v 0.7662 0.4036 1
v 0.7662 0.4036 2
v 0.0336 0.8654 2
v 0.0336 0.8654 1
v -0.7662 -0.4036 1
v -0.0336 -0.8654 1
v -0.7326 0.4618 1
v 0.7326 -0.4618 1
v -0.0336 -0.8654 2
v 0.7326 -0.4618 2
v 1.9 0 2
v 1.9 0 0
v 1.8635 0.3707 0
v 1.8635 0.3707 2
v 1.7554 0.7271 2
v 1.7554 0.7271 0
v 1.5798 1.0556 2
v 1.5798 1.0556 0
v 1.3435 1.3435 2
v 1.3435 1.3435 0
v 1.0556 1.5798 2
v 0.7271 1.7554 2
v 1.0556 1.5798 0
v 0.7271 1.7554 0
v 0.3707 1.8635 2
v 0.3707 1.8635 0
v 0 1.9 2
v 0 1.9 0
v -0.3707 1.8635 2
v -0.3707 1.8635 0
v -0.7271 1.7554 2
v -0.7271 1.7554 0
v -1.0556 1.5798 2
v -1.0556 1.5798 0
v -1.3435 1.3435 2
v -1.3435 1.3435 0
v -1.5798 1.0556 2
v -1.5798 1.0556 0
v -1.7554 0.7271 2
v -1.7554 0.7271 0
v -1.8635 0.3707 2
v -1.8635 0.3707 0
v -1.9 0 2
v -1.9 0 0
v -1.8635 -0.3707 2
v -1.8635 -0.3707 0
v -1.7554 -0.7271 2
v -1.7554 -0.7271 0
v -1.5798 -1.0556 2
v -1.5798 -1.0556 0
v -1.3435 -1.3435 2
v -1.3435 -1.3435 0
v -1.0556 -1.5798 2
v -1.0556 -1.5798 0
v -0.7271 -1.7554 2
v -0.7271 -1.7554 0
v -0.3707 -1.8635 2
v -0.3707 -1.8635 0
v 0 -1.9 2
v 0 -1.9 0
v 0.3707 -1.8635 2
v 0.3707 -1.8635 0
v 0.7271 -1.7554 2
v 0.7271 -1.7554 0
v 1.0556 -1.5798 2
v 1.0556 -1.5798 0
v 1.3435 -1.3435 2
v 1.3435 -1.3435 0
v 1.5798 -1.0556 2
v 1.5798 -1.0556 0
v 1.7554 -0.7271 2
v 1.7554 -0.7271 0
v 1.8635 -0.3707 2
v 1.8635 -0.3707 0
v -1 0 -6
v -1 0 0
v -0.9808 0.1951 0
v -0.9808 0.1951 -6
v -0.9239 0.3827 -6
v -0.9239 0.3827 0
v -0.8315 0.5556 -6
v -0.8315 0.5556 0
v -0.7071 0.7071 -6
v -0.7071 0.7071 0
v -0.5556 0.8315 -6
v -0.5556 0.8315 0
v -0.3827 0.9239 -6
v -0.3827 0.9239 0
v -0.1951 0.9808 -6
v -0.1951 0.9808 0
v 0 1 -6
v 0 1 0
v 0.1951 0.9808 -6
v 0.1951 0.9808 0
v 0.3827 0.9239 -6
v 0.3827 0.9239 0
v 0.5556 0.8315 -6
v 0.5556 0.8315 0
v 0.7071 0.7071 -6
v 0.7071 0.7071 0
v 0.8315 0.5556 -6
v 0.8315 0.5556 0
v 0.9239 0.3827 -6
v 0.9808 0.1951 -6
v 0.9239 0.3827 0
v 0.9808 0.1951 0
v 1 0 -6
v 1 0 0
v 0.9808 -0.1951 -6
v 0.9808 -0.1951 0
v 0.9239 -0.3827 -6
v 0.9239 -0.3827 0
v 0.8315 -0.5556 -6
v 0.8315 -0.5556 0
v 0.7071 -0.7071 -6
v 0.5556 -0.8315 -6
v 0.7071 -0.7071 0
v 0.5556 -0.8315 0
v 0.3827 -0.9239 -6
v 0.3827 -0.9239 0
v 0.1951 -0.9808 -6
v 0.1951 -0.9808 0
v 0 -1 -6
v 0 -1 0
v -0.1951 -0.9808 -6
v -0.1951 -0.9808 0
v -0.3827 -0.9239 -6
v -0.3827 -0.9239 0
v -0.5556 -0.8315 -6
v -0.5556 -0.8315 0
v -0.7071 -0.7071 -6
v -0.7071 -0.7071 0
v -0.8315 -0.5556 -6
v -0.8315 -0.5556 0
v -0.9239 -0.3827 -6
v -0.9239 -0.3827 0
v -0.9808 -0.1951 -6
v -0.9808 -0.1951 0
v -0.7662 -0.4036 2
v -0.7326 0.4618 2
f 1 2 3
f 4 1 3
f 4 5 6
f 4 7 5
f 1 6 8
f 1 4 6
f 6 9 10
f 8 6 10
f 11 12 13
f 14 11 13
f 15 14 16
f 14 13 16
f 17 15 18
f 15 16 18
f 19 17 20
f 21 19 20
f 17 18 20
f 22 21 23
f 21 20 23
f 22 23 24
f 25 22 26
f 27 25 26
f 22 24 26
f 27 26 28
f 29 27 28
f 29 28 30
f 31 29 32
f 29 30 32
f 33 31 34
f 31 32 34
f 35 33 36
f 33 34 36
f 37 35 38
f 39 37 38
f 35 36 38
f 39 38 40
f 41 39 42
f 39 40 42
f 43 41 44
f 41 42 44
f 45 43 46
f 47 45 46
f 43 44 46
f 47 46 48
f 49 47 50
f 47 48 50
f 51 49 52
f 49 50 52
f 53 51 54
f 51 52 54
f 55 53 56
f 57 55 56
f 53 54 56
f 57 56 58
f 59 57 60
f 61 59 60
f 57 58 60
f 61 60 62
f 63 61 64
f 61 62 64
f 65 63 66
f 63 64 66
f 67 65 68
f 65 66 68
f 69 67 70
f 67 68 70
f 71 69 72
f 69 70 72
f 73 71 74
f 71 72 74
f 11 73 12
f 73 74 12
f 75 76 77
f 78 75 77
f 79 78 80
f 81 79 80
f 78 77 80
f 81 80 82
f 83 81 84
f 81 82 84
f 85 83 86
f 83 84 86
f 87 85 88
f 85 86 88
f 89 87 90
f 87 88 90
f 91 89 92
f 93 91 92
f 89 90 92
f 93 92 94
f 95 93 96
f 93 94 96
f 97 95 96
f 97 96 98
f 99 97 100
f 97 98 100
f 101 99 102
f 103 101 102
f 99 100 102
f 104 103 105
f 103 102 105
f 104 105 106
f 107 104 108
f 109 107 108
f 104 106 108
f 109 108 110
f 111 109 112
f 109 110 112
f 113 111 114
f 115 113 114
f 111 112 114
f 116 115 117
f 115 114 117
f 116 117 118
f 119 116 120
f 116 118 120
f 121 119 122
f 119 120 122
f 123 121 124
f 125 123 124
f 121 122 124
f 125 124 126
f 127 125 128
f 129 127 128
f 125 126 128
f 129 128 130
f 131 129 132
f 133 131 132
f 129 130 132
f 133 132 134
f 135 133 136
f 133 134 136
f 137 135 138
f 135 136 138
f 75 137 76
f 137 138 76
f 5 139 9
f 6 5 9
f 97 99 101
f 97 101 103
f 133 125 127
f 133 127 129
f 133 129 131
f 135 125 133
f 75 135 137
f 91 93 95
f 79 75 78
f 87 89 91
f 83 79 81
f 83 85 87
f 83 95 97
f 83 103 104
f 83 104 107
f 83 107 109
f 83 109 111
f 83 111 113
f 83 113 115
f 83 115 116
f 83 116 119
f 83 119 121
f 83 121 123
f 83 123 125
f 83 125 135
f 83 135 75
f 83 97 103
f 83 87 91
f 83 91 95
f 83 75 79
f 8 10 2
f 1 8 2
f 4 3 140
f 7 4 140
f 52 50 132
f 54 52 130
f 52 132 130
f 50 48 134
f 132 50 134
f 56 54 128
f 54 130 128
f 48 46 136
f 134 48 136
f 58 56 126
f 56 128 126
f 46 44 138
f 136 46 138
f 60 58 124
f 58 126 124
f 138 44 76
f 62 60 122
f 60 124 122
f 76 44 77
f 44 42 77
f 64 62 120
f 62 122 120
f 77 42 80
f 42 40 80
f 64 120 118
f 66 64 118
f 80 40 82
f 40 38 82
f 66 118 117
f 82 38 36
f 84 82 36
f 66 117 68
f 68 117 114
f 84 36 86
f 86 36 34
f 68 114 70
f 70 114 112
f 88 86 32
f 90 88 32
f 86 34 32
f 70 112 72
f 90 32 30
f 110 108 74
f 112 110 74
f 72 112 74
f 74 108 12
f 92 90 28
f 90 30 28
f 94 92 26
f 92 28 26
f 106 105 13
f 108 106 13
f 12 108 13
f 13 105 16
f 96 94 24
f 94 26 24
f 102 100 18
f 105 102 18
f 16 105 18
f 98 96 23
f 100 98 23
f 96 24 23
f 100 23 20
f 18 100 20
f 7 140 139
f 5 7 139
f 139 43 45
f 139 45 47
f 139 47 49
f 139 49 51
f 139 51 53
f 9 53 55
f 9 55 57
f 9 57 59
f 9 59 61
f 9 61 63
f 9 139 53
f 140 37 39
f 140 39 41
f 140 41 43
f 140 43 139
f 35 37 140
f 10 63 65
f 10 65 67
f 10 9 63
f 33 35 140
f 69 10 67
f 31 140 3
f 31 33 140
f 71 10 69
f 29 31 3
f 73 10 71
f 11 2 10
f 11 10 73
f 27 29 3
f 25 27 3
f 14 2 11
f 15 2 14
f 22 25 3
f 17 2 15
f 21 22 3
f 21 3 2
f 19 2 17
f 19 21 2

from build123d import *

# Parameters (mm, degrees)
SKETCH_1_R          = 1.9
EXTRUDE_1_DEPTH     = 2
SKETCH_2_R          = 1
EXTRUDE_2_DEPTH     = 6
CUT_EXTRUDE_1_DEPTH = 1


with BuildPart() as part:
    # 草图1 → 凸台-拉伸1 (new body)
    with BuildSketch(Plane.XY):
        Circle(SKETCH_1_R)
    extrude(amount=EXTRUDE_1_DEPTH)

    # 草图2 → 凸台-拉伸2 (add)
    with BuildSketch(Plane(origin=(0, 0, 0), x_dir=(-1, 0, 0), z_dir=(0, 0, -1))):
        Circle(SKETCH_2_R)
    extrude(amount=EXTRUDE_2_DEPTH)

    # 草图3 → 切除-拉伸1 (cut)
    with BuildSketch(Plane.XY.offset(2)):
        Polygon((-0.766222709, -0.403612141), (-0.033572987, -0.865374401), (0.732649722, -0.461762261), (0.766222709, 0.403612141), (0.033572987, 0.865374401), (-0.732649722, 0.461762261), align=None)
    extrude(amount=-CUT_EXTRUDE_1_DEPTH, mode=Mode.SUBTRACT)


solid = part.part
